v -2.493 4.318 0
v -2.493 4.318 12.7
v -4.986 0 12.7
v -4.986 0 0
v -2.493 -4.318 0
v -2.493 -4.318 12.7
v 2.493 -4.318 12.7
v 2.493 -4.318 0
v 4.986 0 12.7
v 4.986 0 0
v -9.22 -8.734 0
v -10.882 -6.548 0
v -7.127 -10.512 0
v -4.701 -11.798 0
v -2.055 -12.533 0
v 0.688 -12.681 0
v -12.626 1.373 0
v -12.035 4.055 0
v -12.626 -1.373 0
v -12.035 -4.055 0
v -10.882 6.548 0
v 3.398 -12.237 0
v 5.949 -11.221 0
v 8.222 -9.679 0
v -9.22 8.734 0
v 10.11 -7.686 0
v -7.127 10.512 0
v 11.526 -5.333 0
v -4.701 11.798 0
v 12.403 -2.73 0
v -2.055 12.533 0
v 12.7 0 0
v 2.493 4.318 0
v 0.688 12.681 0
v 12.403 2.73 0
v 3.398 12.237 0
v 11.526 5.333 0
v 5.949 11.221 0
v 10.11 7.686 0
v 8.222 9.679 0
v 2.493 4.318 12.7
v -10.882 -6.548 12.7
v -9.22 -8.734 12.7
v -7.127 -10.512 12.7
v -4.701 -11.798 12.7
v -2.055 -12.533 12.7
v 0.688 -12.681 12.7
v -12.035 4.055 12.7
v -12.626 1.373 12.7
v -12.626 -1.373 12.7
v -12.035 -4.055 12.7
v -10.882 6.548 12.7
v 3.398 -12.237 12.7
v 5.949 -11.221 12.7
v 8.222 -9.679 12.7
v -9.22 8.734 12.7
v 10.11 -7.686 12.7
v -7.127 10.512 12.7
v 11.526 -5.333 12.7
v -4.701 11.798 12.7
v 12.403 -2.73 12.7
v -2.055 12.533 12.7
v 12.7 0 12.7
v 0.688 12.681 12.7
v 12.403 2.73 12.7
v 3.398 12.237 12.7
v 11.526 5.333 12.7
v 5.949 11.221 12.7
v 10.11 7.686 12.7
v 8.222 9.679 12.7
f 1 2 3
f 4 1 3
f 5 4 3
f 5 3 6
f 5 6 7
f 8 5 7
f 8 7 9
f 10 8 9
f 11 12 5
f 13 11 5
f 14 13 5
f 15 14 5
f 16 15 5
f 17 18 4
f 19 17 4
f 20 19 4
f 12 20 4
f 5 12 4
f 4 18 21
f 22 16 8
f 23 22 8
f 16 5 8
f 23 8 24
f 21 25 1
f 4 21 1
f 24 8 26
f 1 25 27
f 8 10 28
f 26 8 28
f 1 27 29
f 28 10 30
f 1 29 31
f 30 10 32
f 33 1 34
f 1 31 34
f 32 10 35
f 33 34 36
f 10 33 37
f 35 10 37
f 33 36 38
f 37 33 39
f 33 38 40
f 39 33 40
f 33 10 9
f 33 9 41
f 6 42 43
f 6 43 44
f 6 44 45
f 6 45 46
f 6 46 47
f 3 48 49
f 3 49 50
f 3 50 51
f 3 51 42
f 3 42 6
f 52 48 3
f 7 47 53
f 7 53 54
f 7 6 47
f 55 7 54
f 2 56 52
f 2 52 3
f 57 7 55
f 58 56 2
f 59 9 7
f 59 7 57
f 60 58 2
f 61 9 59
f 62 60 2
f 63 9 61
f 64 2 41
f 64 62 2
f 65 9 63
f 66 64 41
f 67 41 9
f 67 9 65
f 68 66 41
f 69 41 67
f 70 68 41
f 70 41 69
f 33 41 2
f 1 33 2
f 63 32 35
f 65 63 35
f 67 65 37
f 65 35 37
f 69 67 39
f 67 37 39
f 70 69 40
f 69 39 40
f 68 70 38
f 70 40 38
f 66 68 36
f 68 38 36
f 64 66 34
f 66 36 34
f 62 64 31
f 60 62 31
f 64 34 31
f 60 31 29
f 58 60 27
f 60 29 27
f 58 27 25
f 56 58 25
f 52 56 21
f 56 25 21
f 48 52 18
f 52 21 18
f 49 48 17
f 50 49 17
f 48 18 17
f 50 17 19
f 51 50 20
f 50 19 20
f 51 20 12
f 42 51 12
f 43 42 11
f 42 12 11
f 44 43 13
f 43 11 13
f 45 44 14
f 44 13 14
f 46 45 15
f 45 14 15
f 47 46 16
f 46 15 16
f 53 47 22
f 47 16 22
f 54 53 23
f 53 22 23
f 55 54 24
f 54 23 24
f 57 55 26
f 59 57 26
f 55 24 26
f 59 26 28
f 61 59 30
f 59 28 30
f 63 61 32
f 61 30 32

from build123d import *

# Parameters (mm, degrees)
SKETCH2_R           = 12.7
BOSS_EXTRUDE1_DEPTH = 12.7
CUT_EXTRUDE1_DEPTH  = 22.997045256


with BuildPart() as part:
    # Sketch2 → Boss-Extrude1 (new body)
    with BuildSketch(Plane(origin=(0, 0, 0), x_dir=(0, 1, 0), z_dir=(0, 0, 1))):
        with Locations(Location((0, 0, 0), (0, 0, 270))):
            Circle(SKETCH2_R)
    extrude(amount=BOSS_EXTRUDE1_DEPTH)

    # Sketch3 → Cut-Extrude1 (cut, through all)
    with BuildSketch(Plane.XY.offset(12.7)):
        Polygon((-2.492998462, -4.318), (2.492998462, -4.318), (4.985996925, 0), (2.492998462, 4.318), (-2.492998462, 4.318), (-4.985996925, 0), align=None)
    extrude(amount=-CUT_EXTRUDE1_DEPTH, mode=Mode.SUBTRACT)


solid = part.part
